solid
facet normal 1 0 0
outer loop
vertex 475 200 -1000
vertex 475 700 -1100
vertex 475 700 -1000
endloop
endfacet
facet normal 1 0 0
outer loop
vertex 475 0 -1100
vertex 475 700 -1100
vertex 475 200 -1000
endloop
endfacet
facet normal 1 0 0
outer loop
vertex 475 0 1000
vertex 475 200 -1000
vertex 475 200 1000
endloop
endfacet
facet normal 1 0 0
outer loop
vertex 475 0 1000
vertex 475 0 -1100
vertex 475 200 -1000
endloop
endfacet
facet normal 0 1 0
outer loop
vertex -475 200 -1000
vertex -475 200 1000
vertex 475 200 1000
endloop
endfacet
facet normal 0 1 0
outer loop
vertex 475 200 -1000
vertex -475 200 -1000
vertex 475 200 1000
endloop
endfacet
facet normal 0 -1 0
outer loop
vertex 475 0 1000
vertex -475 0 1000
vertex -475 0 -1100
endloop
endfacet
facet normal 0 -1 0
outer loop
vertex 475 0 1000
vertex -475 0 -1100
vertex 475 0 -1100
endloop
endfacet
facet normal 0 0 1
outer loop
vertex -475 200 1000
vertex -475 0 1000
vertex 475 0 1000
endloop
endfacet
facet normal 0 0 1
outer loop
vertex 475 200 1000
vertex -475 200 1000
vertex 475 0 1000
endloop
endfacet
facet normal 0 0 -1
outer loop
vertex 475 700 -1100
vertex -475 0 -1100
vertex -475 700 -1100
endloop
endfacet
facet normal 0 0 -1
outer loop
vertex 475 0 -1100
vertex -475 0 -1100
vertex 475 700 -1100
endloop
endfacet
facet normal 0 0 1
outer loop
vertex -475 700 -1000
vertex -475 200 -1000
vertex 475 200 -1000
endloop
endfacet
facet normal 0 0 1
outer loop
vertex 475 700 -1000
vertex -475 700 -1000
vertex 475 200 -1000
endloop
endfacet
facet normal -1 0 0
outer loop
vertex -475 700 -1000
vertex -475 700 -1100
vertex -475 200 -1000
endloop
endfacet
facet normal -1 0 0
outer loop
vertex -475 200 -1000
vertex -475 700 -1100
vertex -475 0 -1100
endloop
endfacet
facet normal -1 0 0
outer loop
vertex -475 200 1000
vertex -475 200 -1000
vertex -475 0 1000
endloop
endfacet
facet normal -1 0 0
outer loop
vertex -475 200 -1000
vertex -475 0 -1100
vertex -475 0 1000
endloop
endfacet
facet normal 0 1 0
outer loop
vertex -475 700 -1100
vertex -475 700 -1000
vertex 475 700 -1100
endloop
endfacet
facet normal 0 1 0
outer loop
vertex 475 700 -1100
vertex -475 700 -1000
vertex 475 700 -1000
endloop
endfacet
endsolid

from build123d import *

# Parameters (mm, degrees)
SKETCH1_W           = 950
SKETCH1_H           = 2000
BOSS_EXTRUDE1_DEPTH = 200
SKETCH2_W           = 950
SKETCH2_H           = 100
BOSS_EXTRUDE2_DEPTH = 700


with BuildPart() as part:
    # Sketch1 → Boss-Extrude1 (new body)
    with BuildSketch(Plane(origin=(0, 0, 0), x_dir=(1, 0, 0), z_dir=(0, 1, 0))):
        Rectangle(SKETCH1_W, SKETCH1_H)
    extrude(amount=BOSS_EXTRUDE1_DEPTH)

    # Sketch2 → Boss-Extrude2 (add)
    with BuildSketch(Plane.XZ):
        with Locations((0, -1050)):
            Rectangle(SKETCH2_W, SKETCH2_H)
    extrude(amount=-BOSS_EXTRUDE2_DEPTH)


solid = part.part
